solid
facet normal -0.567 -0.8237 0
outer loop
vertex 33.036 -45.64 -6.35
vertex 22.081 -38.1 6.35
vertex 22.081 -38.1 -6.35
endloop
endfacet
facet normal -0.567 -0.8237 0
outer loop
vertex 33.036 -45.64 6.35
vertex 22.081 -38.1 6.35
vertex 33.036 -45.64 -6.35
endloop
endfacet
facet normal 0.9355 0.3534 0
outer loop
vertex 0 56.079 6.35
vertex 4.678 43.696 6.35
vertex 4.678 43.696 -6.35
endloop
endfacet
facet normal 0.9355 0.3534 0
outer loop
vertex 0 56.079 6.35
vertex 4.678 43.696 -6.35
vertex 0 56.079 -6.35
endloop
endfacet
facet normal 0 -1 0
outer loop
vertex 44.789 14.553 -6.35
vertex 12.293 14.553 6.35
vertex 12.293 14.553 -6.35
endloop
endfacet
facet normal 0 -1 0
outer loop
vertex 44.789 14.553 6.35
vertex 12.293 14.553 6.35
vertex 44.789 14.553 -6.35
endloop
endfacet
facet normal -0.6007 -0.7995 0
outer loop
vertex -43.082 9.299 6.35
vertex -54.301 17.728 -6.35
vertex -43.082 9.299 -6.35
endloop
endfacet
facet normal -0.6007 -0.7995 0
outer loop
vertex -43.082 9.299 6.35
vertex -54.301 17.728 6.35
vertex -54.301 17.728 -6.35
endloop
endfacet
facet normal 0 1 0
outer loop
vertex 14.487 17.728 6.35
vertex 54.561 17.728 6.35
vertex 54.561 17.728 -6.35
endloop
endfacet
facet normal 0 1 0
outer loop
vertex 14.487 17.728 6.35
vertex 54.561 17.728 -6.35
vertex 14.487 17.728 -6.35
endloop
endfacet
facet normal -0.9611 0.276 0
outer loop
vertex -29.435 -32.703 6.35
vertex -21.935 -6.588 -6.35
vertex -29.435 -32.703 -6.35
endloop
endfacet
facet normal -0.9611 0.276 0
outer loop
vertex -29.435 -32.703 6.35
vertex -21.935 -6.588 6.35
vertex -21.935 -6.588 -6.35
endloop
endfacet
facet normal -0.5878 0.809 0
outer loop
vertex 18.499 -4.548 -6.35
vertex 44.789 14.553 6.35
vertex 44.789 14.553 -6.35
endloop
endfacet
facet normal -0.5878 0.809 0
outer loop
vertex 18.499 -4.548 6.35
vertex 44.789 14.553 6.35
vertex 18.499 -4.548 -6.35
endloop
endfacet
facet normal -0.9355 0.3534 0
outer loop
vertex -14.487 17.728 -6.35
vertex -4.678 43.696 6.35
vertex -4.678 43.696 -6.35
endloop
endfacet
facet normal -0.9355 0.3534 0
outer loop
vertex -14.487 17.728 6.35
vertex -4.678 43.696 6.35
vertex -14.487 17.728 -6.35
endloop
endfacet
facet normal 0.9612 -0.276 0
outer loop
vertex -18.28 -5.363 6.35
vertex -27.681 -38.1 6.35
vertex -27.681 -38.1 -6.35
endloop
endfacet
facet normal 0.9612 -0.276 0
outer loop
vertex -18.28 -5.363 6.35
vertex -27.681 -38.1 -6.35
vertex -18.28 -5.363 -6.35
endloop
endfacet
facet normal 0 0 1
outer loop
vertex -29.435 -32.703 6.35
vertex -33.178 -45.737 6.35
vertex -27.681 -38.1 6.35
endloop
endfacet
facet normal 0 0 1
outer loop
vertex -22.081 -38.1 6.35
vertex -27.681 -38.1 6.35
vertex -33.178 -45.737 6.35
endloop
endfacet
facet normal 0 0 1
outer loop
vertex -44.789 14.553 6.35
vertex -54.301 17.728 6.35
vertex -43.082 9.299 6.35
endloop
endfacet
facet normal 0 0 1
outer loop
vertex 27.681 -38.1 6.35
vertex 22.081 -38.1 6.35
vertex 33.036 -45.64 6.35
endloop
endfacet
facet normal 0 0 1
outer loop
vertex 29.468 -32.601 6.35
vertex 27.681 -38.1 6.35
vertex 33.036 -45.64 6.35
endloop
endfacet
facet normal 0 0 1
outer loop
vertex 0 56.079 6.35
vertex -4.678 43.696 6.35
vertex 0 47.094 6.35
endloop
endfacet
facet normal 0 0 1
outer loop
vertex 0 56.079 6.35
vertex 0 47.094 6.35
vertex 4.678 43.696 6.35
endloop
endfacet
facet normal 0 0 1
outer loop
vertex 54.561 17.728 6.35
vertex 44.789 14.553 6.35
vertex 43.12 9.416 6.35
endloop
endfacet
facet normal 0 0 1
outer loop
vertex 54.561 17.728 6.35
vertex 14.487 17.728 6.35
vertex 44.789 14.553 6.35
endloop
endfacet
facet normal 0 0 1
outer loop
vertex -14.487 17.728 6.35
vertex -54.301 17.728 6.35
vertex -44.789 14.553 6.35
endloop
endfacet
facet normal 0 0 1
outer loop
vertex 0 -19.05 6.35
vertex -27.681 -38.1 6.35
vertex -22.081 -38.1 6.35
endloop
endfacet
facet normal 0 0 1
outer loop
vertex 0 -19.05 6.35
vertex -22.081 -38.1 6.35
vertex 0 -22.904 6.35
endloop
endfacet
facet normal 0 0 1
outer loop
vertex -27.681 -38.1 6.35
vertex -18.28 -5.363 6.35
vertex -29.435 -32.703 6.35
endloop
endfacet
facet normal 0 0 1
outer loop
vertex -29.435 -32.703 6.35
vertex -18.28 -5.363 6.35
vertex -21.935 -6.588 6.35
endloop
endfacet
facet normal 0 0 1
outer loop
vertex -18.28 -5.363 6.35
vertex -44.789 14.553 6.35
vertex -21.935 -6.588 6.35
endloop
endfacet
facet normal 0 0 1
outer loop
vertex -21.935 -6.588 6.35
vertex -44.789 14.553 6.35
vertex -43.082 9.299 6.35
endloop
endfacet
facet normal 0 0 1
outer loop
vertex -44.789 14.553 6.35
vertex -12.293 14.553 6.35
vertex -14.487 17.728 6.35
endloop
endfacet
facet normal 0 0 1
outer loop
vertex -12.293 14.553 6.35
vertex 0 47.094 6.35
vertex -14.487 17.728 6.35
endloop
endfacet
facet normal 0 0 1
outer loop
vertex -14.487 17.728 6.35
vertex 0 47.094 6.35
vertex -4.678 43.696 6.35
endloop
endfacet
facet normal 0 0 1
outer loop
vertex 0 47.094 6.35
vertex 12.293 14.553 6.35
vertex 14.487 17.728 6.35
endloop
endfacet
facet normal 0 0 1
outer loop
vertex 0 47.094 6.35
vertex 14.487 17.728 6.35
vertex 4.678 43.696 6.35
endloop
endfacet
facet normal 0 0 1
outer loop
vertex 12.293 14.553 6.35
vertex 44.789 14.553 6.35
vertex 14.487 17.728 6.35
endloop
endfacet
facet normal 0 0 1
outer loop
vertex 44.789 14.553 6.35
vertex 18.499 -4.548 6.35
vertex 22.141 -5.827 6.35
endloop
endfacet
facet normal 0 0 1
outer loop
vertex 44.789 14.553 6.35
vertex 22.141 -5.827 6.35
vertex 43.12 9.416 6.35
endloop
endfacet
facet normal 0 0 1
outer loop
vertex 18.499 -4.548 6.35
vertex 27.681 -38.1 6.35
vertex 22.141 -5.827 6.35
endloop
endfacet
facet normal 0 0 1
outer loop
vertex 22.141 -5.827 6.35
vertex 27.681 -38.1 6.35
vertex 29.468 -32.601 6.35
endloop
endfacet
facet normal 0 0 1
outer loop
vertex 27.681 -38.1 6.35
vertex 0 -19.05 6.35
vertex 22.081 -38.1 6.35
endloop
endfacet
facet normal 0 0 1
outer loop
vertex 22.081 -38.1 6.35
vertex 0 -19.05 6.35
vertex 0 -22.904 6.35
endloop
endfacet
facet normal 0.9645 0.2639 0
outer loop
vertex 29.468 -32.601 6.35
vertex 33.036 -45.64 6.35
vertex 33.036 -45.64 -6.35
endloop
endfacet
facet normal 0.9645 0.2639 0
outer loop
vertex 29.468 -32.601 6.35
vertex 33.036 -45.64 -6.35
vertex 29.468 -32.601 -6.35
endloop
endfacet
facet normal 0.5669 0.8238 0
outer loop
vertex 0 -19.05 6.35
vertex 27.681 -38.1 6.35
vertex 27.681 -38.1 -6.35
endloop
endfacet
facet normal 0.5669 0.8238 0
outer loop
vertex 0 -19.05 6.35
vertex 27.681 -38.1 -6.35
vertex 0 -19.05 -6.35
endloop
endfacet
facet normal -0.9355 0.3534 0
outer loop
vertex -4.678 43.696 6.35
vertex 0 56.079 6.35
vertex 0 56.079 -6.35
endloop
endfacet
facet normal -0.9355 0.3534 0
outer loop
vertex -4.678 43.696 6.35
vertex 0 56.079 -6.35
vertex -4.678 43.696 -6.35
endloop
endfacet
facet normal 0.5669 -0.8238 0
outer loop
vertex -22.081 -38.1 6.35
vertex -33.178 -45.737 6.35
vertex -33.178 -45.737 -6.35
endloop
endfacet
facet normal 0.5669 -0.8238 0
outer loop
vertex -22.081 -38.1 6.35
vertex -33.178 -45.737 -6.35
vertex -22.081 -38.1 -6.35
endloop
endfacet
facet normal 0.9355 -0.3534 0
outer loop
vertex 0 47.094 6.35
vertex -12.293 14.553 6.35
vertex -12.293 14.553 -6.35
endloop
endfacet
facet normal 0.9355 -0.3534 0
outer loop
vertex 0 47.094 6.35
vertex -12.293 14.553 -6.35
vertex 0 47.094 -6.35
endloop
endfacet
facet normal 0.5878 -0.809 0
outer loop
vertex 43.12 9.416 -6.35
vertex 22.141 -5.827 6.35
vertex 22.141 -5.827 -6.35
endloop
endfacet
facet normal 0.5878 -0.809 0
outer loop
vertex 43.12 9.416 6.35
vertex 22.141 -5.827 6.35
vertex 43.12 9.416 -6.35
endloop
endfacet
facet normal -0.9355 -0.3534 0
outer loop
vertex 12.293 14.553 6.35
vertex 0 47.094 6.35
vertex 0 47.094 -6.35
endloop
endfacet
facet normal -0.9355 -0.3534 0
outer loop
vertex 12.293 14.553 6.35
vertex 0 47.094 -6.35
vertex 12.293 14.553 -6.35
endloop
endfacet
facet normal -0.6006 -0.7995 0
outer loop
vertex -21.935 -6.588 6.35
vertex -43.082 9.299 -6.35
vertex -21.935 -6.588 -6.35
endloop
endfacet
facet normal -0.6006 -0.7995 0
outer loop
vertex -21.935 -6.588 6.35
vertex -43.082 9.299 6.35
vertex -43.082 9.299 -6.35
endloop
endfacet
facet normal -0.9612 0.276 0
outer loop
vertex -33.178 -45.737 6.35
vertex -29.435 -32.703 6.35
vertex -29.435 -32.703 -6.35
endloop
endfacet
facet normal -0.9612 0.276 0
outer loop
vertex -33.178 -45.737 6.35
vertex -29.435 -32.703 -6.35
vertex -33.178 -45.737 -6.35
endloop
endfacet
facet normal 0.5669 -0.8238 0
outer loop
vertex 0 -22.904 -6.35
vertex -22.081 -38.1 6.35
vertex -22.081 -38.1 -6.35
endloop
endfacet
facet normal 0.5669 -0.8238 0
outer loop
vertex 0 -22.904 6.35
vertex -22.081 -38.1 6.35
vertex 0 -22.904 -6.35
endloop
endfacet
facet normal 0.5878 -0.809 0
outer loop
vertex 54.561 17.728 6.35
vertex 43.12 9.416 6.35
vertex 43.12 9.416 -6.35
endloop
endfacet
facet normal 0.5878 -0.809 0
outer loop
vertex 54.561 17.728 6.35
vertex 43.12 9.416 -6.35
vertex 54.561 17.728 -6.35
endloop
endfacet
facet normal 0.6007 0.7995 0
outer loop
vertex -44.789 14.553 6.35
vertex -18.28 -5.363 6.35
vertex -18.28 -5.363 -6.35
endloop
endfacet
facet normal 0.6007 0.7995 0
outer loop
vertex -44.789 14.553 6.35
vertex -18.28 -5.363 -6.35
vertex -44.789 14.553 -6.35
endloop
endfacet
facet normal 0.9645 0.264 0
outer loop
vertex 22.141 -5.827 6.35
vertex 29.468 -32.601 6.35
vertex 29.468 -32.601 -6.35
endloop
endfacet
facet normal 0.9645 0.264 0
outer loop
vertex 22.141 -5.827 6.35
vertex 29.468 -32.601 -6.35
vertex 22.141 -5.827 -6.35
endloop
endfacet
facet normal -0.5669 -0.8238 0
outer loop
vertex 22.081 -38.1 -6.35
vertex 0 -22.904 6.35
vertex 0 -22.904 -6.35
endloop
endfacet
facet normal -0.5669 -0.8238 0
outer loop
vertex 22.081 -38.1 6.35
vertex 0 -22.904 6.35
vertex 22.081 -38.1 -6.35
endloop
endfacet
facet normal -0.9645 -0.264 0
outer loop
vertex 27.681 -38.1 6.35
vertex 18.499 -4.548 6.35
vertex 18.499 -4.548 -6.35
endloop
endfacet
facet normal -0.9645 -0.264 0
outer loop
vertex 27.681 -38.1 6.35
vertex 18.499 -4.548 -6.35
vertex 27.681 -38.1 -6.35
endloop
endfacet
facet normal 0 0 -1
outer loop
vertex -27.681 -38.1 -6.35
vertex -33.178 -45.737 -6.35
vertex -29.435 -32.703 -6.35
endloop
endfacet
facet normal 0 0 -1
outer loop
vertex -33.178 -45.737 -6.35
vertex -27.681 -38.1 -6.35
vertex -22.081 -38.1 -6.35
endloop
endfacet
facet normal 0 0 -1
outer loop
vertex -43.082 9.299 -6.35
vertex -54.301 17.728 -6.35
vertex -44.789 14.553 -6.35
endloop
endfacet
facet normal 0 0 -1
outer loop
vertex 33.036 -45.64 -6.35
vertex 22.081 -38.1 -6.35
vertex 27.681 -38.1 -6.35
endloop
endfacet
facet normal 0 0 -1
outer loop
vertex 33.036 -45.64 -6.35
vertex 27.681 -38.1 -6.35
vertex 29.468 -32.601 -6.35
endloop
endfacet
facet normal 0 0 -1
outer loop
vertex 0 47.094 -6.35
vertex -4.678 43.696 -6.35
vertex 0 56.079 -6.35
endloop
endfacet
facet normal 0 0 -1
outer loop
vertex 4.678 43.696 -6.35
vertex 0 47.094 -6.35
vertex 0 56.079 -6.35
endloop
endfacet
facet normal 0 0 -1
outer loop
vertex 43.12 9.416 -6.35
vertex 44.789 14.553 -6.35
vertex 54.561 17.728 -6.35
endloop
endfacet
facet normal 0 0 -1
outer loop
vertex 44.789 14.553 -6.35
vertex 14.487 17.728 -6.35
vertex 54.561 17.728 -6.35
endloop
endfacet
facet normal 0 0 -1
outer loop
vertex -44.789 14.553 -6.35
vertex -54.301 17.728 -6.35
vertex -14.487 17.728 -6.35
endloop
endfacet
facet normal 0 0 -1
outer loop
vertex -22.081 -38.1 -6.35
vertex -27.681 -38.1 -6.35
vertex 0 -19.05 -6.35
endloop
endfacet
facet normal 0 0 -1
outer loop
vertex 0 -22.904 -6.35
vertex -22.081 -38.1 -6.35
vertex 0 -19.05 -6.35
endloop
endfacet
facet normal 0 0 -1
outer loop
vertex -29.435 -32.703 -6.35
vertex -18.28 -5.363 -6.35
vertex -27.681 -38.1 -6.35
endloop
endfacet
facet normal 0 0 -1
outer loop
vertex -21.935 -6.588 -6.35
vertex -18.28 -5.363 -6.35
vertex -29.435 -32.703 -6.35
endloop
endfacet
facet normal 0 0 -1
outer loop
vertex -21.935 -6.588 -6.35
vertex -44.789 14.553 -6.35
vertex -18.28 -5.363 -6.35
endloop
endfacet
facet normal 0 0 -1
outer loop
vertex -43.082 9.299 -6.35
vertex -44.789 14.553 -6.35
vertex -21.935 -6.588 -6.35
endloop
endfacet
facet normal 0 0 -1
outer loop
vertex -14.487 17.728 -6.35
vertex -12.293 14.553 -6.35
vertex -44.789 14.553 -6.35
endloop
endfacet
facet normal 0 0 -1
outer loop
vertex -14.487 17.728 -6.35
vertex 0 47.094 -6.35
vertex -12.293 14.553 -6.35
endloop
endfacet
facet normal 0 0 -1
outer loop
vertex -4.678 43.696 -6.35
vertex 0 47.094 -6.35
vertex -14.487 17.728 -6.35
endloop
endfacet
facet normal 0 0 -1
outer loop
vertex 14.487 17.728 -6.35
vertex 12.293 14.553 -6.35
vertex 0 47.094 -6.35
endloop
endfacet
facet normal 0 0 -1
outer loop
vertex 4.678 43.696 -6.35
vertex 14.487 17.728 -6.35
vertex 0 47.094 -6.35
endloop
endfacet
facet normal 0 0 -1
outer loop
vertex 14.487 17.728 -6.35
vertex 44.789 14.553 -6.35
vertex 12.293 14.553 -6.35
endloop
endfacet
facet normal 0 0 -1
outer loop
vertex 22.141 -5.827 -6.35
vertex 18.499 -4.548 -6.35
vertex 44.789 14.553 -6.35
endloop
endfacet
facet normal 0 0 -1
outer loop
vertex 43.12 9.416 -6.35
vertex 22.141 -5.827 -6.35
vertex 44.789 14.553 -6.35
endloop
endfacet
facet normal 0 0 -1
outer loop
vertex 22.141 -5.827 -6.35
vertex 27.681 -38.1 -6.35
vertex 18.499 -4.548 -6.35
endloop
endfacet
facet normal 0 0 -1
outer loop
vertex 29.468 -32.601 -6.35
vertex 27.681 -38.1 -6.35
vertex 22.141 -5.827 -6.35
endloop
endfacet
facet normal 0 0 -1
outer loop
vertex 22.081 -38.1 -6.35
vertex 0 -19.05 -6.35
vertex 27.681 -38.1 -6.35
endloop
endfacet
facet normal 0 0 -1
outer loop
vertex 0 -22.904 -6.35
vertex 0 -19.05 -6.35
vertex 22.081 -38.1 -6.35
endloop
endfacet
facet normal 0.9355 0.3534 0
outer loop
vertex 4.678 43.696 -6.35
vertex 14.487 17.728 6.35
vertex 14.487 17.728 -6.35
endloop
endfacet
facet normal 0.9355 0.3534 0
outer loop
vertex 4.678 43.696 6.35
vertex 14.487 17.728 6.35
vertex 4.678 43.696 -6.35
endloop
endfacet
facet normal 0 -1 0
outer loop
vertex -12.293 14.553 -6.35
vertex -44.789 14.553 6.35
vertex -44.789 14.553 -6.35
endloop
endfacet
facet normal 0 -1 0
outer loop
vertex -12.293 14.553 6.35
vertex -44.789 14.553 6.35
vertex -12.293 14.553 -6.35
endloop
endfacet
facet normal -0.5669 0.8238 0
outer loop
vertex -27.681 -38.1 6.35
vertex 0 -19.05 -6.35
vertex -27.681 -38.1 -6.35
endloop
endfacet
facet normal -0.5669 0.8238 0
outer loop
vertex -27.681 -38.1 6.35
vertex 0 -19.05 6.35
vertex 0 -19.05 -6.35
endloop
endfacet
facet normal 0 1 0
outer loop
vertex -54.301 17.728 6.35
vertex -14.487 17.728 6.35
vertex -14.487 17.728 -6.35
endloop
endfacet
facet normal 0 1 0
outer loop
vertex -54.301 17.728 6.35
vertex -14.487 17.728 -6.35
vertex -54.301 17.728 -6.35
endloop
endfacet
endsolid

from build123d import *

# Parameters (mm, degrees)
F1_DEPTH = 6.35


with BuildPart() as f1:
    # F0 (on Top) → F1 (new body, symmetric)
    with BuildSketch(Plane.XY):
        Polygon((-44.789236, 14.552905), (-40.419224, 17.727905), (-54.301441, 17.727905), (-43.082257, 9.299362), align=None)
        Polygon((-27.68127, -38.1), (-18.27958, -5.362784), (-44.789236, 14.552905), (-43.082257, 9.299362), (-21.934765, -6.587938), (-29.434755, -32.703328), align=None)
        Polygon((-12.292903, 14.552905), (0, 47.09419), (-4.677891, 43.695503), (-14.487496, 17.727905), (-40.419224, 17.727905), (-44.789236, 14.552905), align=None)
        Polygon((-4.677891, 43.695503), (0, 47.09419), (4.677891, 43.695503), (0, 56.078631), align=None)
        Polygon((4.677891, 43.695503), (0, 47.09419), (12.292903, 14.552905), (44.789236, 14.552905), (40.419224, 17.727905), (14.487496, 17.727905), align=None)
        Polygon((54.560881, 17.727905), (40.419224, 17.727905), (44.789236, 14.552905), (43.12004, 9.415647), align=None)
        Polygon((43.12004, 9.415647), (44.789236, 14.552905), (18.49915, -4.547961), (27.68127, -38.1), (29.468066, -32.600809), (22.140832, -5.82664), align=None)
        Polygon((29.468066, -32.600809), (27.68127, -38.1), (22.080786, -38.1), (33.036342, -45.639515), align=None)
        Polygon((27.68127, -38.1), (0, -19.05), (-27.68127, -38.1), (-22.080786, -38.1), (0, -22.904203), (22.080786, -38.1), align=None)
        Polygon((-22.080786, -38.1), (-27.68127, -38.1), (-29.434755, -32.703328), (-33.177816, -45.736876), align=None)
    extrude(amount=F1_DEPTH, both=True)


solid = f1.part
